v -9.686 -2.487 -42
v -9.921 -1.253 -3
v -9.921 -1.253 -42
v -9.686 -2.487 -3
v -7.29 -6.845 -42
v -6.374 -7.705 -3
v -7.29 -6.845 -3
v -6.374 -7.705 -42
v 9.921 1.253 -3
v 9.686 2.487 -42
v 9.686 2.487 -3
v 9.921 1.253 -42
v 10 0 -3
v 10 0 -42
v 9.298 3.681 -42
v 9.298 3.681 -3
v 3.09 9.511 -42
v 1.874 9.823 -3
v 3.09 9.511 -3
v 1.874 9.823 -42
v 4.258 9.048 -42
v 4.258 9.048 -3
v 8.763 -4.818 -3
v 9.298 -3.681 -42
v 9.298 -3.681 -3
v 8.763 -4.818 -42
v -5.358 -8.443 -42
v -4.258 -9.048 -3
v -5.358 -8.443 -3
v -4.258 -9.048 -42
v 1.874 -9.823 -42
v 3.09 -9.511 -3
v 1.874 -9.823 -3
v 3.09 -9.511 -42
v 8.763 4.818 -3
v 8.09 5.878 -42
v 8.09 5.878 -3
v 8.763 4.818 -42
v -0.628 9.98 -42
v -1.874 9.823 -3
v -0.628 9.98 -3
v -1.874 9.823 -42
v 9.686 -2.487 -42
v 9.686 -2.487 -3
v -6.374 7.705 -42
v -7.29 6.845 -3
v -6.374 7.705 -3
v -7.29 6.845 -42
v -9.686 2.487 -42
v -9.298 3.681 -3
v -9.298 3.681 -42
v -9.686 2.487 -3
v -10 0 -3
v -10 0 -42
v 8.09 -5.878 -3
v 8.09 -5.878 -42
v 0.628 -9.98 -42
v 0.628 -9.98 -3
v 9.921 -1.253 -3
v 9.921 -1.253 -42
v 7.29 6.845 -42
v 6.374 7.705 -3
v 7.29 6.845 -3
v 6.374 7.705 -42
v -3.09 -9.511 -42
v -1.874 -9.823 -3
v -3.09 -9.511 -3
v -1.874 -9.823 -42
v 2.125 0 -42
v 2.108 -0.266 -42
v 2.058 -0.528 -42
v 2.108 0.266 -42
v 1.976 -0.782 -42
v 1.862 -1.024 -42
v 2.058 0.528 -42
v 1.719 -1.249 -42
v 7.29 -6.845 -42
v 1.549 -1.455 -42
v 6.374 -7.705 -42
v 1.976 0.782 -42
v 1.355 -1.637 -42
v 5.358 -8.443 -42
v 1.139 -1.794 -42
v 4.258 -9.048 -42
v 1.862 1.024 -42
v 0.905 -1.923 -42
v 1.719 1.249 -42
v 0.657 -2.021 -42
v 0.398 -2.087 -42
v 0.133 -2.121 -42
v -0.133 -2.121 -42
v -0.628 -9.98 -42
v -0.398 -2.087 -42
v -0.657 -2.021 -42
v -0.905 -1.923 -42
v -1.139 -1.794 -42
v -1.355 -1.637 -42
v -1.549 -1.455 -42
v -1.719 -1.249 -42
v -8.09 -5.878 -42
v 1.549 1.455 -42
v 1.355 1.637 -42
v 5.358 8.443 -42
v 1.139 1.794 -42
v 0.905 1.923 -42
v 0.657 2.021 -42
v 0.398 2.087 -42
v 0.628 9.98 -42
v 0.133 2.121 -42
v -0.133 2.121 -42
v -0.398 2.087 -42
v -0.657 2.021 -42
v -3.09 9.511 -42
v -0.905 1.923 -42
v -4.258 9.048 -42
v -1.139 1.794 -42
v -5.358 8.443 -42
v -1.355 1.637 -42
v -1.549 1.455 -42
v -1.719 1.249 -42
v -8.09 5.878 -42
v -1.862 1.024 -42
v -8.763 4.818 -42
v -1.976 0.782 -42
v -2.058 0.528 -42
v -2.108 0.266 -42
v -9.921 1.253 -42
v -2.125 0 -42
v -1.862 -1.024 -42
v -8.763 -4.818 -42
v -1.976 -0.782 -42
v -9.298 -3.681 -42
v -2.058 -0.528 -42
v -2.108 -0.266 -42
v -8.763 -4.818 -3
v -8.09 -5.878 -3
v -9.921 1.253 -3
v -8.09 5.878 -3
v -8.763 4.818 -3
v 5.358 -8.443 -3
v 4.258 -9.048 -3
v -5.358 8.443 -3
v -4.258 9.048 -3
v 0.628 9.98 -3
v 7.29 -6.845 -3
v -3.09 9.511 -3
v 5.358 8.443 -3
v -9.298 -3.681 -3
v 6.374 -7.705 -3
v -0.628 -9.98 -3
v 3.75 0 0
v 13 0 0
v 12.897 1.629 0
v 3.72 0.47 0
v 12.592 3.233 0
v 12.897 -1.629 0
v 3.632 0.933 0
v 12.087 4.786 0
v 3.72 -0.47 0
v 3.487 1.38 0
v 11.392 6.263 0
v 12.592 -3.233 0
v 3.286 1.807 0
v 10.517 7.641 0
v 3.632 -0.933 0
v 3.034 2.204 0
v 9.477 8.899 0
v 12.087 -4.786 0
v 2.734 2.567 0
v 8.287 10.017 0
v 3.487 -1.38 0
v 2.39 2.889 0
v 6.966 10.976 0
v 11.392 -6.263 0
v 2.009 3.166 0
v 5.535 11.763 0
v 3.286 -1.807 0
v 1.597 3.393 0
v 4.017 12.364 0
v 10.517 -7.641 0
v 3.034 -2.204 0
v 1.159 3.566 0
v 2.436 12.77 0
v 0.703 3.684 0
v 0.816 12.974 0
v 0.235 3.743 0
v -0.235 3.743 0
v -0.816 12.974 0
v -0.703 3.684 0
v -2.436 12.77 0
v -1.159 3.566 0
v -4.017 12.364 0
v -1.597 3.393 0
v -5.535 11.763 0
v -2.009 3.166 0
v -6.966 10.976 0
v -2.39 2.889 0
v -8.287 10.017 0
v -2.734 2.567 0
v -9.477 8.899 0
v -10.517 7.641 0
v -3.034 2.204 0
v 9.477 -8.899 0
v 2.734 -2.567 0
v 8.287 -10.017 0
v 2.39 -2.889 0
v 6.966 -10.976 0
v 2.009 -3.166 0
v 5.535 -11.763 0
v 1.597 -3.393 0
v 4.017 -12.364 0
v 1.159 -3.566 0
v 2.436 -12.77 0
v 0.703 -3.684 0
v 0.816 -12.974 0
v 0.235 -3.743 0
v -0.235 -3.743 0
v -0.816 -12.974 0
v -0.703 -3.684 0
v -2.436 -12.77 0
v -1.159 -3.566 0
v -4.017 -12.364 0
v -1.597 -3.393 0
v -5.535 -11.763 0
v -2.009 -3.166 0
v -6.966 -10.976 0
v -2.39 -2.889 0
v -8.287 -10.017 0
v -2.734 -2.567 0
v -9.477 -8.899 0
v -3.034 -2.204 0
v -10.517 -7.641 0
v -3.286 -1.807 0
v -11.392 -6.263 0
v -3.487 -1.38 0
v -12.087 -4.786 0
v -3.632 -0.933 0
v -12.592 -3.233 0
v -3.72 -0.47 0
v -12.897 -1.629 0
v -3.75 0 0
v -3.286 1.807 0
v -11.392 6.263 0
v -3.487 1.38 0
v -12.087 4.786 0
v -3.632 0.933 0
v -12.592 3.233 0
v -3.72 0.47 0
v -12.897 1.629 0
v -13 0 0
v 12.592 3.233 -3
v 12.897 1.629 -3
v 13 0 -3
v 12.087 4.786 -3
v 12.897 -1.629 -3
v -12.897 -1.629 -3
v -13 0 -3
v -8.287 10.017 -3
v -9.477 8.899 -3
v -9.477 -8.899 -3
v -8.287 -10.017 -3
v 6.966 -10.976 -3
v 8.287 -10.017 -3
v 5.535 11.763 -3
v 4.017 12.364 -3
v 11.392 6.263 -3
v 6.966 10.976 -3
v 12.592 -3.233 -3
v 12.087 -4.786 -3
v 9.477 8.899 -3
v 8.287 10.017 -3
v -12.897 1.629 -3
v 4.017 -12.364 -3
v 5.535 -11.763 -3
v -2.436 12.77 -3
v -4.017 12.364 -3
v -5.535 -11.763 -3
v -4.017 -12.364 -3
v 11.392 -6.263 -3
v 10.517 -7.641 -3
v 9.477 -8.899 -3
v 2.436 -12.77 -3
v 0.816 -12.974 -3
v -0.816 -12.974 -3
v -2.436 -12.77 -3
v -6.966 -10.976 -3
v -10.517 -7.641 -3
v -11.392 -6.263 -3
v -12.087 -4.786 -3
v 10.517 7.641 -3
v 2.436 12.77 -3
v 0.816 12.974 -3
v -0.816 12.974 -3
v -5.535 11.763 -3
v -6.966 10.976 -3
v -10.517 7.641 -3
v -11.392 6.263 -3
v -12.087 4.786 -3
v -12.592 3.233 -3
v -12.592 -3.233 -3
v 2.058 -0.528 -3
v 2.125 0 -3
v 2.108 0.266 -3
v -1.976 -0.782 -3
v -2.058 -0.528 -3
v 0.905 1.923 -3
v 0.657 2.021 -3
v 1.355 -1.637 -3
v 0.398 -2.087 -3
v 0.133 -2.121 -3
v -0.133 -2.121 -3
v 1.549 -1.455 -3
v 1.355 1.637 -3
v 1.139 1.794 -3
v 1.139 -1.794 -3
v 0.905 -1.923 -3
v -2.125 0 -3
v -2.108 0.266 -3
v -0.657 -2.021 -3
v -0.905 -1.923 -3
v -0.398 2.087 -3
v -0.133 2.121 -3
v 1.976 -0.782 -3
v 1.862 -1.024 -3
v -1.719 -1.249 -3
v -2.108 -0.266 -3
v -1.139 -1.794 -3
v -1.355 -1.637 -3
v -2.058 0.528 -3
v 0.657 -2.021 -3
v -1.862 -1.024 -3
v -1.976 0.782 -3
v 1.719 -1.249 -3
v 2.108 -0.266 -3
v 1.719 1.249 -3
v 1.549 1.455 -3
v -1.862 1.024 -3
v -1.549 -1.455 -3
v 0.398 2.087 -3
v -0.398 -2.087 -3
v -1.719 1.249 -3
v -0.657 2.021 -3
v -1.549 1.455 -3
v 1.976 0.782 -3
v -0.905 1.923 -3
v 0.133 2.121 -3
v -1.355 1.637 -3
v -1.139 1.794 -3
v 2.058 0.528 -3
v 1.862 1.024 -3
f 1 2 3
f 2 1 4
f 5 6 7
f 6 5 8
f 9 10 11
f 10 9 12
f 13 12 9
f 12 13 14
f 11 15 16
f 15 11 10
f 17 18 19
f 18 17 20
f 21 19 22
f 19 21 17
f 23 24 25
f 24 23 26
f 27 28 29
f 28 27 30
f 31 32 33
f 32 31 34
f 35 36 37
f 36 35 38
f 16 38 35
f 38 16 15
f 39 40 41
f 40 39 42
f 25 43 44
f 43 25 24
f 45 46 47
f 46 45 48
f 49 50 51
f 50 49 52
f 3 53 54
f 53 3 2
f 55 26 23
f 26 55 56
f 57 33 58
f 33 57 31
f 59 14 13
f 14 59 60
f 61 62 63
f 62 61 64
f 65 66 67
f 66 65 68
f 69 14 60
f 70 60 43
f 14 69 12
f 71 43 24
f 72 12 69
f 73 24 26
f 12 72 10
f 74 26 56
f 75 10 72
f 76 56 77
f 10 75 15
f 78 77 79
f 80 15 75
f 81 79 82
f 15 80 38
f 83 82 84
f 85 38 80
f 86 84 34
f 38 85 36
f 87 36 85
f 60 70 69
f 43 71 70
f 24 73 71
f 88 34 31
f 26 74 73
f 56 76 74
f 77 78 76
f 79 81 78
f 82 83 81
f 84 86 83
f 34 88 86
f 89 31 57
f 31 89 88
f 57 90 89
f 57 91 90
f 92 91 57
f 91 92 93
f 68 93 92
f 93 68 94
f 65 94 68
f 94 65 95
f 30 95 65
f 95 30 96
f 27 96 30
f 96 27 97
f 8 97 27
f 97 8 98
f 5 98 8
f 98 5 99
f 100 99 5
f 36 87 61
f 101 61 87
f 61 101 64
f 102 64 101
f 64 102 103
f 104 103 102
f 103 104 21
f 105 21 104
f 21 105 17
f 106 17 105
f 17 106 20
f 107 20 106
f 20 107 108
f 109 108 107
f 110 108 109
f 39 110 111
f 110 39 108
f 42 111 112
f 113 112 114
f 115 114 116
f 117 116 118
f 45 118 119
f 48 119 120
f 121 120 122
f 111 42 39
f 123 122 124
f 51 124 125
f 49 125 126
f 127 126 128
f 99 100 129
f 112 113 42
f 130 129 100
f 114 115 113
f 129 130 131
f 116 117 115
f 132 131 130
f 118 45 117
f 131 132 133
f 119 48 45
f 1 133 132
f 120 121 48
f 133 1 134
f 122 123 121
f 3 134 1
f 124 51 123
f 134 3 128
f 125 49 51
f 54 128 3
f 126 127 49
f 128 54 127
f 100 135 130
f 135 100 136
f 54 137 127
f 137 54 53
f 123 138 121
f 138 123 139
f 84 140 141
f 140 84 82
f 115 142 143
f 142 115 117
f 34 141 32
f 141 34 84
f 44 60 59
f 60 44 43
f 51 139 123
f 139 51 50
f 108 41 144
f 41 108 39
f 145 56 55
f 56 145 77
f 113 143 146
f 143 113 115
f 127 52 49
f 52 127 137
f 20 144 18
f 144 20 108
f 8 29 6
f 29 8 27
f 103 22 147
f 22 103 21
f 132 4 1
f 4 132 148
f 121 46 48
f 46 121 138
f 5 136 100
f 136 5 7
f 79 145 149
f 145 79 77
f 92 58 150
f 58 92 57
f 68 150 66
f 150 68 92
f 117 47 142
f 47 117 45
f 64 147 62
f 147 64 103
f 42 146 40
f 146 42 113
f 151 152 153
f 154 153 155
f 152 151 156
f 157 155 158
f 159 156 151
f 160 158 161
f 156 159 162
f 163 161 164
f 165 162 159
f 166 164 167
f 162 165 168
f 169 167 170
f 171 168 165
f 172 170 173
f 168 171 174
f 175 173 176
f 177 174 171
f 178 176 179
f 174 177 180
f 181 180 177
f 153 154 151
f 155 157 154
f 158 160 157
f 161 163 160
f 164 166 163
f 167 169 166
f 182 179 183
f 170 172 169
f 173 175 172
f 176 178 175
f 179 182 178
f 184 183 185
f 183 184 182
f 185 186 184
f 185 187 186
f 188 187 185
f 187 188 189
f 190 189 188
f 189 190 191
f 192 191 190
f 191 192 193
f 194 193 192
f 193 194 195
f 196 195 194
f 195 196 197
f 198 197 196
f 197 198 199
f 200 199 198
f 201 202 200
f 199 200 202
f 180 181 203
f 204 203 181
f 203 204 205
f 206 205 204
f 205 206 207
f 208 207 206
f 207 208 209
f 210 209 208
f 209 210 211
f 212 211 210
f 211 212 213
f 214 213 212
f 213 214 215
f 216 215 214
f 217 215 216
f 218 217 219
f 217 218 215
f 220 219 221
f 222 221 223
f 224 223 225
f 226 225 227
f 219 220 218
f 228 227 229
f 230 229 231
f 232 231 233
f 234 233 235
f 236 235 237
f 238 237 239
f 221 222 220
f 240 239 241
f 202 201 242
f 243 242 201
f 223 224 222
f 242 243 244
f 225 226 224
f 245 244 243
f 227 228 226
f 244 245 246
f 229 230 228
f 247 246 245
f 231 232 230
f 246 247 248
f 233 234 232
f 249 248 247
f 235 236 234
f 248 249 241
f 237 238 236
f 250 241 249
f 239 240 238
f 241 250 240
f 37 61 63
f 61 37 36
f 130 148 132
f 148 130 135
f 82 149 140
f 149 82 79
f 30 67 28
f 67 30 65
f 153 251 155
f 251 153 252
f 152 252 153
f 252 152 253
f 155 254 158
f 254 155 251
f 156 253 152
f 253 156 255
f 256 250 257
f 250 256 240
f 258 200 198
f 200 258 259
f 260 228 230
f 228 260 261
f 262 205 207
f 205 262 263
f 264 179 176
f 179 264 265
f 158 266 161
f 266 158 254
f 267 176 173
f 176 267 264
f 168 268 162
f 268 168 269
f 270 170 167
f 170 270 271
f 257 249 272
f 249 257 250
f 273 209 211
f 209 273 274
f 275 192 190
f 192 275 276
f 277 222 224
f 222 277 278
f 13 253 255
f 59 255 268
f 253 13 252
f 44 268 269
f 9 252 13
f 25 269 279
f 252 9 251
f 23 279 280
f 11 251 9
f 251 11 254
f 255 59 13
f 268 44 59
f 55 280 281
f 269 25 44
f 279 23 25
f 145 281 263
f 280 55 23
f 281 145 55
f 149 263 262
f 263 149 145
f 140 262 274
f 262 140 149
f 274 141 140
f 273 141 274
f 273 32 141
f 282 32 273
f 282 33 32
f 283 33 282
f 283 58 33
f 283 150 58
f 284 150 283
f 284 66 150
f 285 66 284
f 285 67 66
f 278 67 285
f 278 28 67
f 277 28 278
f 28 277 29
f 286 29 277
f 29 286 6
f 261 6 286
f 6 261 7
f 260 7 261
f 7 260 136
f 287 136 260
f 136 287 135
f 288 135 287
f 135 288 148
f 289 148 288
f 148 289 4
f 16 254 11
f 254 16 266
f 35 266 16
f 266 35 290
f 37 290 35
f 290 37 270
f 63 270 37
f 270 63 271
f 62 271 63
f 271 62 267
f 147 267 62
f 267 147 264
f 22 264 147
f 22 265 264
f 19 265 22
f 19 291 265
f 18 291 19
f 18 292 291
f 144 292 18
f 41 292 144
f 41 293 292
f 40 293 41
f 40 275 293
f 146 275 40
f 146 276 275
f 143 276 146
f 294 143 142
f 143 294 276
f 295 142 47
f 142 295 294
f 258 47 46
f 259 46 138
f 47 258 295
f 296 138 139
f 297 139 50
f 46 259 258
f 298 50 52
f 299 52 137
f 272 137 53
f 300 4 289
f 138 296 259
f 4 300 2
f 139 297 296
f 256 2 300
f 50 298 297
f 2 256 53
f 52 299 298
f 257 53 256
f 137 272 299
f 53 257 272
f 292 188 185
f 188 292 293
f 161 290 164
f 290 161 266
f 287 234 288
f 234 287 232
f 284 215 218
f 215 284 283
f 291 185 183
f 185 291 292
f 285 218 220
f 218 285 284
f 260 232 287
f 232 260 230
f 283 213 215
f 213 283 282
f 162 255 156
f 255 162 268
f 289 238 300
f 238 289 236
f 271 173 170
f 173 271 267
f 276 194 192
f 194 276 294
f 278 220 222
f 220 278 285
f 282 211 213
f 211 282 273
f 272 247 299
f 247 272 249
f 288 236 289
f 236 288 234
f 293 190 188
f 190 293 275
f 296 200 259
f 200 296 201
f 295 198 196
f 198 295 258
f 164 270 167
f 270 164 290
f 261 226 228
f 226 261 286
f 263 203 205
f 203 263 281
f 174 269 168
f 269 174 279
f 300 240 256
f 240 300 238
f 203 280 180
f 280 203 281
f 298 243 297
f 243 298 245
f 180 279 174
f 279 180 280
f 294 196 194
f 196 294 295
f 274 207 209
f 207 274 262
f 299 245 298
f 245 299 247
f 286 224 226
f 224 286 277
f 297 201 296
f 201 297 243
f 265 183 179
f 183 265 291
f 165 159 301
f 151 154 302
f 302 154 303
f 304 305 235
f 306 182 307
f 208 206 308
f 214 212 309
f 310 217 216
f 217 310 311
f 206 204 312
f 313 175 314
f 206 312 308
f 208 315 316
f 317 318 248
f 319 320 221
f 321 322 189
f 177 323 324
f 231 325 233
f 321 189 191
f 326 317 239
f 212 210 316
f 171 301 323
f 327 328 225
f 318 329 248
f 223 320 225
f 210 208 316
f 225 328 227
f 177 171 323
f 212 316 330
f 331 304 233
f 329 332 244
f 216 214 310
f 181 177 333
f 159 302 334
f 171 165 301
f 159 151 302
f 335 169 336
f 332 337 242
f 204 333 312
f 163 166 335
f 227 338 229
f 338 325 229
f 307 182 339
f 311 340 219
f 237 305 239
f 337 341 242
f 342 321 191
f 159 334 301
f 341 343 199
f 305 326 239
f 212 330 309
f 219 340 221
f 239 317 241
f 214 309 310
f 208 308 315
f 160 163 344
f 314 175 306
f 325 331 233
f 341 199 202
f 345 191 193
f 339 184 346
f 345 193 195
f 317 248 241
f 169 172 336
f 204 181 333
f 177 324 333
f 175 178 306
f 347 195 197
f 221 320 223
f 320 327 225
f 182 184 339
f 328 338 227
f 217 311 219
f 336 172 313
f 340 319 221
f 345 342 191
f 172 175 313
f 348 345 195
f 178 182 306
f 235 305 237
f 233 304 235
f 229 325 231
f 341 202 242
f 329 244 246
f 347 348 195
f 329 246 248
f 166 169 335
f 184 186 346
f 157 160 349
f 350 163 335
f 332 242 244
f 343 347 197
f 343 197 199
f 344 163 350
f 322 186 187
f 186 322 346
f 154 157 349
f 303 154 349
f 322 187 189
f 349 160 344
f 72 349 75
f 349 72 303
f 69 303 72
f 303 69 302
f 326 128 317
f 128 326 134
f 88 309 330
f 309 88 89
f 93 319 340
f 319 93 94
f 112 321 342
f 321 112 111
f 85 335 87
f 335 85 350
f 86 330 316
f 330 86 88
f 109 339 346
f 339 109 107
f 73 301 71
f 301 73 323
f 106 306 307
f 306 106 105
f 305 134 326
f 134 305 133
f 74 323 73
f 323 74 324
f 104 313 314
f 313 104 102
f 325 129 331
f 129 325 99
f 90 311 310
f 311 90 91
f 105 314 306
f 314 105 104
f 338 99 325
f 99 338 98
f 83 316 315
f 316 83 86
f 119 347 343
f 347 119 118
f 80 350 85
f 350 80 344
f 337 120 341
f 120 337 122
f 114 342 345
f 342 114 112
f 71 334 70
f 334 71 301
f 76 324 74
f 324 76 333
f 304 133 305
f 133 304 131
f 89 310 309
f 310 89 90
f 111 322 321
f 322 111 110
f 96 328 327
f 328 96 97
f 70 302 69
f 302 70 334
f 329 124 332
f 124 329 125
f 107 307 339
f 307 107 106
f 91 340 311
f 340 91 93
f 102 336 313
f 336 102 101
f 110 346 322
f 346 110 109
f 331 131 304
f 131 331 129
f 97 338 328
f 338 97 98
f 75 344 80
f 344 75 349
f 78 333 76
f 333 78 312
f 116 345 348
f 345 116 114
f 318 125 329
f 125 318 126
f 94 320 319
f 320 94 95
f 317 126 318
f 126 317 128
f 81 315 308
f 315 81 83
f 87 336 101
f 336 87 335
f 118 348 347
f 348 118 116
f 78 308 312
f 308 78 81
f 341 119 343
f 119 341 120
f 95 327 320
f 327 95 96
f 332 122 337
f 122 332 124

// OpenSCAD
$fn = 50;


difference() {
	union() {
		translate(v = [0, 0, -42.0000000000]) {
			cylinder(h = 42, r = 10.0000000000);
		}
		translate(v = [0, 0, -3.0000000000]) {
			cylinder(h = 3, r = 13.0000000000);
		}
	}
	union() {
		translate(v = [0, 0, 0]) {
			rotate(a = [0, 0, 0]) {
				difference() {
					union() {
						#translate(v = [0, 0, -42.0000000000]) {
							cylinder(h = 42, r = 2.0000000000);
						}
						#translate(v = [0, 0, -3]) {
							cylinder(h = 3, r = 10.0000000000, r1 = 2.1250000000, r2 = 3.7500000000);
						}
						#translate(v = [0, 0, -42.0000000000]) {
							cylinder(h = 42, r = 2.1250000000);
						}
						#translate(v = [0, 0, -42.0000000000]) {
							cylinder(h = 42, r = 2.0000000000);
						}
					}
					union();
				}
			}
		}
	}
}
